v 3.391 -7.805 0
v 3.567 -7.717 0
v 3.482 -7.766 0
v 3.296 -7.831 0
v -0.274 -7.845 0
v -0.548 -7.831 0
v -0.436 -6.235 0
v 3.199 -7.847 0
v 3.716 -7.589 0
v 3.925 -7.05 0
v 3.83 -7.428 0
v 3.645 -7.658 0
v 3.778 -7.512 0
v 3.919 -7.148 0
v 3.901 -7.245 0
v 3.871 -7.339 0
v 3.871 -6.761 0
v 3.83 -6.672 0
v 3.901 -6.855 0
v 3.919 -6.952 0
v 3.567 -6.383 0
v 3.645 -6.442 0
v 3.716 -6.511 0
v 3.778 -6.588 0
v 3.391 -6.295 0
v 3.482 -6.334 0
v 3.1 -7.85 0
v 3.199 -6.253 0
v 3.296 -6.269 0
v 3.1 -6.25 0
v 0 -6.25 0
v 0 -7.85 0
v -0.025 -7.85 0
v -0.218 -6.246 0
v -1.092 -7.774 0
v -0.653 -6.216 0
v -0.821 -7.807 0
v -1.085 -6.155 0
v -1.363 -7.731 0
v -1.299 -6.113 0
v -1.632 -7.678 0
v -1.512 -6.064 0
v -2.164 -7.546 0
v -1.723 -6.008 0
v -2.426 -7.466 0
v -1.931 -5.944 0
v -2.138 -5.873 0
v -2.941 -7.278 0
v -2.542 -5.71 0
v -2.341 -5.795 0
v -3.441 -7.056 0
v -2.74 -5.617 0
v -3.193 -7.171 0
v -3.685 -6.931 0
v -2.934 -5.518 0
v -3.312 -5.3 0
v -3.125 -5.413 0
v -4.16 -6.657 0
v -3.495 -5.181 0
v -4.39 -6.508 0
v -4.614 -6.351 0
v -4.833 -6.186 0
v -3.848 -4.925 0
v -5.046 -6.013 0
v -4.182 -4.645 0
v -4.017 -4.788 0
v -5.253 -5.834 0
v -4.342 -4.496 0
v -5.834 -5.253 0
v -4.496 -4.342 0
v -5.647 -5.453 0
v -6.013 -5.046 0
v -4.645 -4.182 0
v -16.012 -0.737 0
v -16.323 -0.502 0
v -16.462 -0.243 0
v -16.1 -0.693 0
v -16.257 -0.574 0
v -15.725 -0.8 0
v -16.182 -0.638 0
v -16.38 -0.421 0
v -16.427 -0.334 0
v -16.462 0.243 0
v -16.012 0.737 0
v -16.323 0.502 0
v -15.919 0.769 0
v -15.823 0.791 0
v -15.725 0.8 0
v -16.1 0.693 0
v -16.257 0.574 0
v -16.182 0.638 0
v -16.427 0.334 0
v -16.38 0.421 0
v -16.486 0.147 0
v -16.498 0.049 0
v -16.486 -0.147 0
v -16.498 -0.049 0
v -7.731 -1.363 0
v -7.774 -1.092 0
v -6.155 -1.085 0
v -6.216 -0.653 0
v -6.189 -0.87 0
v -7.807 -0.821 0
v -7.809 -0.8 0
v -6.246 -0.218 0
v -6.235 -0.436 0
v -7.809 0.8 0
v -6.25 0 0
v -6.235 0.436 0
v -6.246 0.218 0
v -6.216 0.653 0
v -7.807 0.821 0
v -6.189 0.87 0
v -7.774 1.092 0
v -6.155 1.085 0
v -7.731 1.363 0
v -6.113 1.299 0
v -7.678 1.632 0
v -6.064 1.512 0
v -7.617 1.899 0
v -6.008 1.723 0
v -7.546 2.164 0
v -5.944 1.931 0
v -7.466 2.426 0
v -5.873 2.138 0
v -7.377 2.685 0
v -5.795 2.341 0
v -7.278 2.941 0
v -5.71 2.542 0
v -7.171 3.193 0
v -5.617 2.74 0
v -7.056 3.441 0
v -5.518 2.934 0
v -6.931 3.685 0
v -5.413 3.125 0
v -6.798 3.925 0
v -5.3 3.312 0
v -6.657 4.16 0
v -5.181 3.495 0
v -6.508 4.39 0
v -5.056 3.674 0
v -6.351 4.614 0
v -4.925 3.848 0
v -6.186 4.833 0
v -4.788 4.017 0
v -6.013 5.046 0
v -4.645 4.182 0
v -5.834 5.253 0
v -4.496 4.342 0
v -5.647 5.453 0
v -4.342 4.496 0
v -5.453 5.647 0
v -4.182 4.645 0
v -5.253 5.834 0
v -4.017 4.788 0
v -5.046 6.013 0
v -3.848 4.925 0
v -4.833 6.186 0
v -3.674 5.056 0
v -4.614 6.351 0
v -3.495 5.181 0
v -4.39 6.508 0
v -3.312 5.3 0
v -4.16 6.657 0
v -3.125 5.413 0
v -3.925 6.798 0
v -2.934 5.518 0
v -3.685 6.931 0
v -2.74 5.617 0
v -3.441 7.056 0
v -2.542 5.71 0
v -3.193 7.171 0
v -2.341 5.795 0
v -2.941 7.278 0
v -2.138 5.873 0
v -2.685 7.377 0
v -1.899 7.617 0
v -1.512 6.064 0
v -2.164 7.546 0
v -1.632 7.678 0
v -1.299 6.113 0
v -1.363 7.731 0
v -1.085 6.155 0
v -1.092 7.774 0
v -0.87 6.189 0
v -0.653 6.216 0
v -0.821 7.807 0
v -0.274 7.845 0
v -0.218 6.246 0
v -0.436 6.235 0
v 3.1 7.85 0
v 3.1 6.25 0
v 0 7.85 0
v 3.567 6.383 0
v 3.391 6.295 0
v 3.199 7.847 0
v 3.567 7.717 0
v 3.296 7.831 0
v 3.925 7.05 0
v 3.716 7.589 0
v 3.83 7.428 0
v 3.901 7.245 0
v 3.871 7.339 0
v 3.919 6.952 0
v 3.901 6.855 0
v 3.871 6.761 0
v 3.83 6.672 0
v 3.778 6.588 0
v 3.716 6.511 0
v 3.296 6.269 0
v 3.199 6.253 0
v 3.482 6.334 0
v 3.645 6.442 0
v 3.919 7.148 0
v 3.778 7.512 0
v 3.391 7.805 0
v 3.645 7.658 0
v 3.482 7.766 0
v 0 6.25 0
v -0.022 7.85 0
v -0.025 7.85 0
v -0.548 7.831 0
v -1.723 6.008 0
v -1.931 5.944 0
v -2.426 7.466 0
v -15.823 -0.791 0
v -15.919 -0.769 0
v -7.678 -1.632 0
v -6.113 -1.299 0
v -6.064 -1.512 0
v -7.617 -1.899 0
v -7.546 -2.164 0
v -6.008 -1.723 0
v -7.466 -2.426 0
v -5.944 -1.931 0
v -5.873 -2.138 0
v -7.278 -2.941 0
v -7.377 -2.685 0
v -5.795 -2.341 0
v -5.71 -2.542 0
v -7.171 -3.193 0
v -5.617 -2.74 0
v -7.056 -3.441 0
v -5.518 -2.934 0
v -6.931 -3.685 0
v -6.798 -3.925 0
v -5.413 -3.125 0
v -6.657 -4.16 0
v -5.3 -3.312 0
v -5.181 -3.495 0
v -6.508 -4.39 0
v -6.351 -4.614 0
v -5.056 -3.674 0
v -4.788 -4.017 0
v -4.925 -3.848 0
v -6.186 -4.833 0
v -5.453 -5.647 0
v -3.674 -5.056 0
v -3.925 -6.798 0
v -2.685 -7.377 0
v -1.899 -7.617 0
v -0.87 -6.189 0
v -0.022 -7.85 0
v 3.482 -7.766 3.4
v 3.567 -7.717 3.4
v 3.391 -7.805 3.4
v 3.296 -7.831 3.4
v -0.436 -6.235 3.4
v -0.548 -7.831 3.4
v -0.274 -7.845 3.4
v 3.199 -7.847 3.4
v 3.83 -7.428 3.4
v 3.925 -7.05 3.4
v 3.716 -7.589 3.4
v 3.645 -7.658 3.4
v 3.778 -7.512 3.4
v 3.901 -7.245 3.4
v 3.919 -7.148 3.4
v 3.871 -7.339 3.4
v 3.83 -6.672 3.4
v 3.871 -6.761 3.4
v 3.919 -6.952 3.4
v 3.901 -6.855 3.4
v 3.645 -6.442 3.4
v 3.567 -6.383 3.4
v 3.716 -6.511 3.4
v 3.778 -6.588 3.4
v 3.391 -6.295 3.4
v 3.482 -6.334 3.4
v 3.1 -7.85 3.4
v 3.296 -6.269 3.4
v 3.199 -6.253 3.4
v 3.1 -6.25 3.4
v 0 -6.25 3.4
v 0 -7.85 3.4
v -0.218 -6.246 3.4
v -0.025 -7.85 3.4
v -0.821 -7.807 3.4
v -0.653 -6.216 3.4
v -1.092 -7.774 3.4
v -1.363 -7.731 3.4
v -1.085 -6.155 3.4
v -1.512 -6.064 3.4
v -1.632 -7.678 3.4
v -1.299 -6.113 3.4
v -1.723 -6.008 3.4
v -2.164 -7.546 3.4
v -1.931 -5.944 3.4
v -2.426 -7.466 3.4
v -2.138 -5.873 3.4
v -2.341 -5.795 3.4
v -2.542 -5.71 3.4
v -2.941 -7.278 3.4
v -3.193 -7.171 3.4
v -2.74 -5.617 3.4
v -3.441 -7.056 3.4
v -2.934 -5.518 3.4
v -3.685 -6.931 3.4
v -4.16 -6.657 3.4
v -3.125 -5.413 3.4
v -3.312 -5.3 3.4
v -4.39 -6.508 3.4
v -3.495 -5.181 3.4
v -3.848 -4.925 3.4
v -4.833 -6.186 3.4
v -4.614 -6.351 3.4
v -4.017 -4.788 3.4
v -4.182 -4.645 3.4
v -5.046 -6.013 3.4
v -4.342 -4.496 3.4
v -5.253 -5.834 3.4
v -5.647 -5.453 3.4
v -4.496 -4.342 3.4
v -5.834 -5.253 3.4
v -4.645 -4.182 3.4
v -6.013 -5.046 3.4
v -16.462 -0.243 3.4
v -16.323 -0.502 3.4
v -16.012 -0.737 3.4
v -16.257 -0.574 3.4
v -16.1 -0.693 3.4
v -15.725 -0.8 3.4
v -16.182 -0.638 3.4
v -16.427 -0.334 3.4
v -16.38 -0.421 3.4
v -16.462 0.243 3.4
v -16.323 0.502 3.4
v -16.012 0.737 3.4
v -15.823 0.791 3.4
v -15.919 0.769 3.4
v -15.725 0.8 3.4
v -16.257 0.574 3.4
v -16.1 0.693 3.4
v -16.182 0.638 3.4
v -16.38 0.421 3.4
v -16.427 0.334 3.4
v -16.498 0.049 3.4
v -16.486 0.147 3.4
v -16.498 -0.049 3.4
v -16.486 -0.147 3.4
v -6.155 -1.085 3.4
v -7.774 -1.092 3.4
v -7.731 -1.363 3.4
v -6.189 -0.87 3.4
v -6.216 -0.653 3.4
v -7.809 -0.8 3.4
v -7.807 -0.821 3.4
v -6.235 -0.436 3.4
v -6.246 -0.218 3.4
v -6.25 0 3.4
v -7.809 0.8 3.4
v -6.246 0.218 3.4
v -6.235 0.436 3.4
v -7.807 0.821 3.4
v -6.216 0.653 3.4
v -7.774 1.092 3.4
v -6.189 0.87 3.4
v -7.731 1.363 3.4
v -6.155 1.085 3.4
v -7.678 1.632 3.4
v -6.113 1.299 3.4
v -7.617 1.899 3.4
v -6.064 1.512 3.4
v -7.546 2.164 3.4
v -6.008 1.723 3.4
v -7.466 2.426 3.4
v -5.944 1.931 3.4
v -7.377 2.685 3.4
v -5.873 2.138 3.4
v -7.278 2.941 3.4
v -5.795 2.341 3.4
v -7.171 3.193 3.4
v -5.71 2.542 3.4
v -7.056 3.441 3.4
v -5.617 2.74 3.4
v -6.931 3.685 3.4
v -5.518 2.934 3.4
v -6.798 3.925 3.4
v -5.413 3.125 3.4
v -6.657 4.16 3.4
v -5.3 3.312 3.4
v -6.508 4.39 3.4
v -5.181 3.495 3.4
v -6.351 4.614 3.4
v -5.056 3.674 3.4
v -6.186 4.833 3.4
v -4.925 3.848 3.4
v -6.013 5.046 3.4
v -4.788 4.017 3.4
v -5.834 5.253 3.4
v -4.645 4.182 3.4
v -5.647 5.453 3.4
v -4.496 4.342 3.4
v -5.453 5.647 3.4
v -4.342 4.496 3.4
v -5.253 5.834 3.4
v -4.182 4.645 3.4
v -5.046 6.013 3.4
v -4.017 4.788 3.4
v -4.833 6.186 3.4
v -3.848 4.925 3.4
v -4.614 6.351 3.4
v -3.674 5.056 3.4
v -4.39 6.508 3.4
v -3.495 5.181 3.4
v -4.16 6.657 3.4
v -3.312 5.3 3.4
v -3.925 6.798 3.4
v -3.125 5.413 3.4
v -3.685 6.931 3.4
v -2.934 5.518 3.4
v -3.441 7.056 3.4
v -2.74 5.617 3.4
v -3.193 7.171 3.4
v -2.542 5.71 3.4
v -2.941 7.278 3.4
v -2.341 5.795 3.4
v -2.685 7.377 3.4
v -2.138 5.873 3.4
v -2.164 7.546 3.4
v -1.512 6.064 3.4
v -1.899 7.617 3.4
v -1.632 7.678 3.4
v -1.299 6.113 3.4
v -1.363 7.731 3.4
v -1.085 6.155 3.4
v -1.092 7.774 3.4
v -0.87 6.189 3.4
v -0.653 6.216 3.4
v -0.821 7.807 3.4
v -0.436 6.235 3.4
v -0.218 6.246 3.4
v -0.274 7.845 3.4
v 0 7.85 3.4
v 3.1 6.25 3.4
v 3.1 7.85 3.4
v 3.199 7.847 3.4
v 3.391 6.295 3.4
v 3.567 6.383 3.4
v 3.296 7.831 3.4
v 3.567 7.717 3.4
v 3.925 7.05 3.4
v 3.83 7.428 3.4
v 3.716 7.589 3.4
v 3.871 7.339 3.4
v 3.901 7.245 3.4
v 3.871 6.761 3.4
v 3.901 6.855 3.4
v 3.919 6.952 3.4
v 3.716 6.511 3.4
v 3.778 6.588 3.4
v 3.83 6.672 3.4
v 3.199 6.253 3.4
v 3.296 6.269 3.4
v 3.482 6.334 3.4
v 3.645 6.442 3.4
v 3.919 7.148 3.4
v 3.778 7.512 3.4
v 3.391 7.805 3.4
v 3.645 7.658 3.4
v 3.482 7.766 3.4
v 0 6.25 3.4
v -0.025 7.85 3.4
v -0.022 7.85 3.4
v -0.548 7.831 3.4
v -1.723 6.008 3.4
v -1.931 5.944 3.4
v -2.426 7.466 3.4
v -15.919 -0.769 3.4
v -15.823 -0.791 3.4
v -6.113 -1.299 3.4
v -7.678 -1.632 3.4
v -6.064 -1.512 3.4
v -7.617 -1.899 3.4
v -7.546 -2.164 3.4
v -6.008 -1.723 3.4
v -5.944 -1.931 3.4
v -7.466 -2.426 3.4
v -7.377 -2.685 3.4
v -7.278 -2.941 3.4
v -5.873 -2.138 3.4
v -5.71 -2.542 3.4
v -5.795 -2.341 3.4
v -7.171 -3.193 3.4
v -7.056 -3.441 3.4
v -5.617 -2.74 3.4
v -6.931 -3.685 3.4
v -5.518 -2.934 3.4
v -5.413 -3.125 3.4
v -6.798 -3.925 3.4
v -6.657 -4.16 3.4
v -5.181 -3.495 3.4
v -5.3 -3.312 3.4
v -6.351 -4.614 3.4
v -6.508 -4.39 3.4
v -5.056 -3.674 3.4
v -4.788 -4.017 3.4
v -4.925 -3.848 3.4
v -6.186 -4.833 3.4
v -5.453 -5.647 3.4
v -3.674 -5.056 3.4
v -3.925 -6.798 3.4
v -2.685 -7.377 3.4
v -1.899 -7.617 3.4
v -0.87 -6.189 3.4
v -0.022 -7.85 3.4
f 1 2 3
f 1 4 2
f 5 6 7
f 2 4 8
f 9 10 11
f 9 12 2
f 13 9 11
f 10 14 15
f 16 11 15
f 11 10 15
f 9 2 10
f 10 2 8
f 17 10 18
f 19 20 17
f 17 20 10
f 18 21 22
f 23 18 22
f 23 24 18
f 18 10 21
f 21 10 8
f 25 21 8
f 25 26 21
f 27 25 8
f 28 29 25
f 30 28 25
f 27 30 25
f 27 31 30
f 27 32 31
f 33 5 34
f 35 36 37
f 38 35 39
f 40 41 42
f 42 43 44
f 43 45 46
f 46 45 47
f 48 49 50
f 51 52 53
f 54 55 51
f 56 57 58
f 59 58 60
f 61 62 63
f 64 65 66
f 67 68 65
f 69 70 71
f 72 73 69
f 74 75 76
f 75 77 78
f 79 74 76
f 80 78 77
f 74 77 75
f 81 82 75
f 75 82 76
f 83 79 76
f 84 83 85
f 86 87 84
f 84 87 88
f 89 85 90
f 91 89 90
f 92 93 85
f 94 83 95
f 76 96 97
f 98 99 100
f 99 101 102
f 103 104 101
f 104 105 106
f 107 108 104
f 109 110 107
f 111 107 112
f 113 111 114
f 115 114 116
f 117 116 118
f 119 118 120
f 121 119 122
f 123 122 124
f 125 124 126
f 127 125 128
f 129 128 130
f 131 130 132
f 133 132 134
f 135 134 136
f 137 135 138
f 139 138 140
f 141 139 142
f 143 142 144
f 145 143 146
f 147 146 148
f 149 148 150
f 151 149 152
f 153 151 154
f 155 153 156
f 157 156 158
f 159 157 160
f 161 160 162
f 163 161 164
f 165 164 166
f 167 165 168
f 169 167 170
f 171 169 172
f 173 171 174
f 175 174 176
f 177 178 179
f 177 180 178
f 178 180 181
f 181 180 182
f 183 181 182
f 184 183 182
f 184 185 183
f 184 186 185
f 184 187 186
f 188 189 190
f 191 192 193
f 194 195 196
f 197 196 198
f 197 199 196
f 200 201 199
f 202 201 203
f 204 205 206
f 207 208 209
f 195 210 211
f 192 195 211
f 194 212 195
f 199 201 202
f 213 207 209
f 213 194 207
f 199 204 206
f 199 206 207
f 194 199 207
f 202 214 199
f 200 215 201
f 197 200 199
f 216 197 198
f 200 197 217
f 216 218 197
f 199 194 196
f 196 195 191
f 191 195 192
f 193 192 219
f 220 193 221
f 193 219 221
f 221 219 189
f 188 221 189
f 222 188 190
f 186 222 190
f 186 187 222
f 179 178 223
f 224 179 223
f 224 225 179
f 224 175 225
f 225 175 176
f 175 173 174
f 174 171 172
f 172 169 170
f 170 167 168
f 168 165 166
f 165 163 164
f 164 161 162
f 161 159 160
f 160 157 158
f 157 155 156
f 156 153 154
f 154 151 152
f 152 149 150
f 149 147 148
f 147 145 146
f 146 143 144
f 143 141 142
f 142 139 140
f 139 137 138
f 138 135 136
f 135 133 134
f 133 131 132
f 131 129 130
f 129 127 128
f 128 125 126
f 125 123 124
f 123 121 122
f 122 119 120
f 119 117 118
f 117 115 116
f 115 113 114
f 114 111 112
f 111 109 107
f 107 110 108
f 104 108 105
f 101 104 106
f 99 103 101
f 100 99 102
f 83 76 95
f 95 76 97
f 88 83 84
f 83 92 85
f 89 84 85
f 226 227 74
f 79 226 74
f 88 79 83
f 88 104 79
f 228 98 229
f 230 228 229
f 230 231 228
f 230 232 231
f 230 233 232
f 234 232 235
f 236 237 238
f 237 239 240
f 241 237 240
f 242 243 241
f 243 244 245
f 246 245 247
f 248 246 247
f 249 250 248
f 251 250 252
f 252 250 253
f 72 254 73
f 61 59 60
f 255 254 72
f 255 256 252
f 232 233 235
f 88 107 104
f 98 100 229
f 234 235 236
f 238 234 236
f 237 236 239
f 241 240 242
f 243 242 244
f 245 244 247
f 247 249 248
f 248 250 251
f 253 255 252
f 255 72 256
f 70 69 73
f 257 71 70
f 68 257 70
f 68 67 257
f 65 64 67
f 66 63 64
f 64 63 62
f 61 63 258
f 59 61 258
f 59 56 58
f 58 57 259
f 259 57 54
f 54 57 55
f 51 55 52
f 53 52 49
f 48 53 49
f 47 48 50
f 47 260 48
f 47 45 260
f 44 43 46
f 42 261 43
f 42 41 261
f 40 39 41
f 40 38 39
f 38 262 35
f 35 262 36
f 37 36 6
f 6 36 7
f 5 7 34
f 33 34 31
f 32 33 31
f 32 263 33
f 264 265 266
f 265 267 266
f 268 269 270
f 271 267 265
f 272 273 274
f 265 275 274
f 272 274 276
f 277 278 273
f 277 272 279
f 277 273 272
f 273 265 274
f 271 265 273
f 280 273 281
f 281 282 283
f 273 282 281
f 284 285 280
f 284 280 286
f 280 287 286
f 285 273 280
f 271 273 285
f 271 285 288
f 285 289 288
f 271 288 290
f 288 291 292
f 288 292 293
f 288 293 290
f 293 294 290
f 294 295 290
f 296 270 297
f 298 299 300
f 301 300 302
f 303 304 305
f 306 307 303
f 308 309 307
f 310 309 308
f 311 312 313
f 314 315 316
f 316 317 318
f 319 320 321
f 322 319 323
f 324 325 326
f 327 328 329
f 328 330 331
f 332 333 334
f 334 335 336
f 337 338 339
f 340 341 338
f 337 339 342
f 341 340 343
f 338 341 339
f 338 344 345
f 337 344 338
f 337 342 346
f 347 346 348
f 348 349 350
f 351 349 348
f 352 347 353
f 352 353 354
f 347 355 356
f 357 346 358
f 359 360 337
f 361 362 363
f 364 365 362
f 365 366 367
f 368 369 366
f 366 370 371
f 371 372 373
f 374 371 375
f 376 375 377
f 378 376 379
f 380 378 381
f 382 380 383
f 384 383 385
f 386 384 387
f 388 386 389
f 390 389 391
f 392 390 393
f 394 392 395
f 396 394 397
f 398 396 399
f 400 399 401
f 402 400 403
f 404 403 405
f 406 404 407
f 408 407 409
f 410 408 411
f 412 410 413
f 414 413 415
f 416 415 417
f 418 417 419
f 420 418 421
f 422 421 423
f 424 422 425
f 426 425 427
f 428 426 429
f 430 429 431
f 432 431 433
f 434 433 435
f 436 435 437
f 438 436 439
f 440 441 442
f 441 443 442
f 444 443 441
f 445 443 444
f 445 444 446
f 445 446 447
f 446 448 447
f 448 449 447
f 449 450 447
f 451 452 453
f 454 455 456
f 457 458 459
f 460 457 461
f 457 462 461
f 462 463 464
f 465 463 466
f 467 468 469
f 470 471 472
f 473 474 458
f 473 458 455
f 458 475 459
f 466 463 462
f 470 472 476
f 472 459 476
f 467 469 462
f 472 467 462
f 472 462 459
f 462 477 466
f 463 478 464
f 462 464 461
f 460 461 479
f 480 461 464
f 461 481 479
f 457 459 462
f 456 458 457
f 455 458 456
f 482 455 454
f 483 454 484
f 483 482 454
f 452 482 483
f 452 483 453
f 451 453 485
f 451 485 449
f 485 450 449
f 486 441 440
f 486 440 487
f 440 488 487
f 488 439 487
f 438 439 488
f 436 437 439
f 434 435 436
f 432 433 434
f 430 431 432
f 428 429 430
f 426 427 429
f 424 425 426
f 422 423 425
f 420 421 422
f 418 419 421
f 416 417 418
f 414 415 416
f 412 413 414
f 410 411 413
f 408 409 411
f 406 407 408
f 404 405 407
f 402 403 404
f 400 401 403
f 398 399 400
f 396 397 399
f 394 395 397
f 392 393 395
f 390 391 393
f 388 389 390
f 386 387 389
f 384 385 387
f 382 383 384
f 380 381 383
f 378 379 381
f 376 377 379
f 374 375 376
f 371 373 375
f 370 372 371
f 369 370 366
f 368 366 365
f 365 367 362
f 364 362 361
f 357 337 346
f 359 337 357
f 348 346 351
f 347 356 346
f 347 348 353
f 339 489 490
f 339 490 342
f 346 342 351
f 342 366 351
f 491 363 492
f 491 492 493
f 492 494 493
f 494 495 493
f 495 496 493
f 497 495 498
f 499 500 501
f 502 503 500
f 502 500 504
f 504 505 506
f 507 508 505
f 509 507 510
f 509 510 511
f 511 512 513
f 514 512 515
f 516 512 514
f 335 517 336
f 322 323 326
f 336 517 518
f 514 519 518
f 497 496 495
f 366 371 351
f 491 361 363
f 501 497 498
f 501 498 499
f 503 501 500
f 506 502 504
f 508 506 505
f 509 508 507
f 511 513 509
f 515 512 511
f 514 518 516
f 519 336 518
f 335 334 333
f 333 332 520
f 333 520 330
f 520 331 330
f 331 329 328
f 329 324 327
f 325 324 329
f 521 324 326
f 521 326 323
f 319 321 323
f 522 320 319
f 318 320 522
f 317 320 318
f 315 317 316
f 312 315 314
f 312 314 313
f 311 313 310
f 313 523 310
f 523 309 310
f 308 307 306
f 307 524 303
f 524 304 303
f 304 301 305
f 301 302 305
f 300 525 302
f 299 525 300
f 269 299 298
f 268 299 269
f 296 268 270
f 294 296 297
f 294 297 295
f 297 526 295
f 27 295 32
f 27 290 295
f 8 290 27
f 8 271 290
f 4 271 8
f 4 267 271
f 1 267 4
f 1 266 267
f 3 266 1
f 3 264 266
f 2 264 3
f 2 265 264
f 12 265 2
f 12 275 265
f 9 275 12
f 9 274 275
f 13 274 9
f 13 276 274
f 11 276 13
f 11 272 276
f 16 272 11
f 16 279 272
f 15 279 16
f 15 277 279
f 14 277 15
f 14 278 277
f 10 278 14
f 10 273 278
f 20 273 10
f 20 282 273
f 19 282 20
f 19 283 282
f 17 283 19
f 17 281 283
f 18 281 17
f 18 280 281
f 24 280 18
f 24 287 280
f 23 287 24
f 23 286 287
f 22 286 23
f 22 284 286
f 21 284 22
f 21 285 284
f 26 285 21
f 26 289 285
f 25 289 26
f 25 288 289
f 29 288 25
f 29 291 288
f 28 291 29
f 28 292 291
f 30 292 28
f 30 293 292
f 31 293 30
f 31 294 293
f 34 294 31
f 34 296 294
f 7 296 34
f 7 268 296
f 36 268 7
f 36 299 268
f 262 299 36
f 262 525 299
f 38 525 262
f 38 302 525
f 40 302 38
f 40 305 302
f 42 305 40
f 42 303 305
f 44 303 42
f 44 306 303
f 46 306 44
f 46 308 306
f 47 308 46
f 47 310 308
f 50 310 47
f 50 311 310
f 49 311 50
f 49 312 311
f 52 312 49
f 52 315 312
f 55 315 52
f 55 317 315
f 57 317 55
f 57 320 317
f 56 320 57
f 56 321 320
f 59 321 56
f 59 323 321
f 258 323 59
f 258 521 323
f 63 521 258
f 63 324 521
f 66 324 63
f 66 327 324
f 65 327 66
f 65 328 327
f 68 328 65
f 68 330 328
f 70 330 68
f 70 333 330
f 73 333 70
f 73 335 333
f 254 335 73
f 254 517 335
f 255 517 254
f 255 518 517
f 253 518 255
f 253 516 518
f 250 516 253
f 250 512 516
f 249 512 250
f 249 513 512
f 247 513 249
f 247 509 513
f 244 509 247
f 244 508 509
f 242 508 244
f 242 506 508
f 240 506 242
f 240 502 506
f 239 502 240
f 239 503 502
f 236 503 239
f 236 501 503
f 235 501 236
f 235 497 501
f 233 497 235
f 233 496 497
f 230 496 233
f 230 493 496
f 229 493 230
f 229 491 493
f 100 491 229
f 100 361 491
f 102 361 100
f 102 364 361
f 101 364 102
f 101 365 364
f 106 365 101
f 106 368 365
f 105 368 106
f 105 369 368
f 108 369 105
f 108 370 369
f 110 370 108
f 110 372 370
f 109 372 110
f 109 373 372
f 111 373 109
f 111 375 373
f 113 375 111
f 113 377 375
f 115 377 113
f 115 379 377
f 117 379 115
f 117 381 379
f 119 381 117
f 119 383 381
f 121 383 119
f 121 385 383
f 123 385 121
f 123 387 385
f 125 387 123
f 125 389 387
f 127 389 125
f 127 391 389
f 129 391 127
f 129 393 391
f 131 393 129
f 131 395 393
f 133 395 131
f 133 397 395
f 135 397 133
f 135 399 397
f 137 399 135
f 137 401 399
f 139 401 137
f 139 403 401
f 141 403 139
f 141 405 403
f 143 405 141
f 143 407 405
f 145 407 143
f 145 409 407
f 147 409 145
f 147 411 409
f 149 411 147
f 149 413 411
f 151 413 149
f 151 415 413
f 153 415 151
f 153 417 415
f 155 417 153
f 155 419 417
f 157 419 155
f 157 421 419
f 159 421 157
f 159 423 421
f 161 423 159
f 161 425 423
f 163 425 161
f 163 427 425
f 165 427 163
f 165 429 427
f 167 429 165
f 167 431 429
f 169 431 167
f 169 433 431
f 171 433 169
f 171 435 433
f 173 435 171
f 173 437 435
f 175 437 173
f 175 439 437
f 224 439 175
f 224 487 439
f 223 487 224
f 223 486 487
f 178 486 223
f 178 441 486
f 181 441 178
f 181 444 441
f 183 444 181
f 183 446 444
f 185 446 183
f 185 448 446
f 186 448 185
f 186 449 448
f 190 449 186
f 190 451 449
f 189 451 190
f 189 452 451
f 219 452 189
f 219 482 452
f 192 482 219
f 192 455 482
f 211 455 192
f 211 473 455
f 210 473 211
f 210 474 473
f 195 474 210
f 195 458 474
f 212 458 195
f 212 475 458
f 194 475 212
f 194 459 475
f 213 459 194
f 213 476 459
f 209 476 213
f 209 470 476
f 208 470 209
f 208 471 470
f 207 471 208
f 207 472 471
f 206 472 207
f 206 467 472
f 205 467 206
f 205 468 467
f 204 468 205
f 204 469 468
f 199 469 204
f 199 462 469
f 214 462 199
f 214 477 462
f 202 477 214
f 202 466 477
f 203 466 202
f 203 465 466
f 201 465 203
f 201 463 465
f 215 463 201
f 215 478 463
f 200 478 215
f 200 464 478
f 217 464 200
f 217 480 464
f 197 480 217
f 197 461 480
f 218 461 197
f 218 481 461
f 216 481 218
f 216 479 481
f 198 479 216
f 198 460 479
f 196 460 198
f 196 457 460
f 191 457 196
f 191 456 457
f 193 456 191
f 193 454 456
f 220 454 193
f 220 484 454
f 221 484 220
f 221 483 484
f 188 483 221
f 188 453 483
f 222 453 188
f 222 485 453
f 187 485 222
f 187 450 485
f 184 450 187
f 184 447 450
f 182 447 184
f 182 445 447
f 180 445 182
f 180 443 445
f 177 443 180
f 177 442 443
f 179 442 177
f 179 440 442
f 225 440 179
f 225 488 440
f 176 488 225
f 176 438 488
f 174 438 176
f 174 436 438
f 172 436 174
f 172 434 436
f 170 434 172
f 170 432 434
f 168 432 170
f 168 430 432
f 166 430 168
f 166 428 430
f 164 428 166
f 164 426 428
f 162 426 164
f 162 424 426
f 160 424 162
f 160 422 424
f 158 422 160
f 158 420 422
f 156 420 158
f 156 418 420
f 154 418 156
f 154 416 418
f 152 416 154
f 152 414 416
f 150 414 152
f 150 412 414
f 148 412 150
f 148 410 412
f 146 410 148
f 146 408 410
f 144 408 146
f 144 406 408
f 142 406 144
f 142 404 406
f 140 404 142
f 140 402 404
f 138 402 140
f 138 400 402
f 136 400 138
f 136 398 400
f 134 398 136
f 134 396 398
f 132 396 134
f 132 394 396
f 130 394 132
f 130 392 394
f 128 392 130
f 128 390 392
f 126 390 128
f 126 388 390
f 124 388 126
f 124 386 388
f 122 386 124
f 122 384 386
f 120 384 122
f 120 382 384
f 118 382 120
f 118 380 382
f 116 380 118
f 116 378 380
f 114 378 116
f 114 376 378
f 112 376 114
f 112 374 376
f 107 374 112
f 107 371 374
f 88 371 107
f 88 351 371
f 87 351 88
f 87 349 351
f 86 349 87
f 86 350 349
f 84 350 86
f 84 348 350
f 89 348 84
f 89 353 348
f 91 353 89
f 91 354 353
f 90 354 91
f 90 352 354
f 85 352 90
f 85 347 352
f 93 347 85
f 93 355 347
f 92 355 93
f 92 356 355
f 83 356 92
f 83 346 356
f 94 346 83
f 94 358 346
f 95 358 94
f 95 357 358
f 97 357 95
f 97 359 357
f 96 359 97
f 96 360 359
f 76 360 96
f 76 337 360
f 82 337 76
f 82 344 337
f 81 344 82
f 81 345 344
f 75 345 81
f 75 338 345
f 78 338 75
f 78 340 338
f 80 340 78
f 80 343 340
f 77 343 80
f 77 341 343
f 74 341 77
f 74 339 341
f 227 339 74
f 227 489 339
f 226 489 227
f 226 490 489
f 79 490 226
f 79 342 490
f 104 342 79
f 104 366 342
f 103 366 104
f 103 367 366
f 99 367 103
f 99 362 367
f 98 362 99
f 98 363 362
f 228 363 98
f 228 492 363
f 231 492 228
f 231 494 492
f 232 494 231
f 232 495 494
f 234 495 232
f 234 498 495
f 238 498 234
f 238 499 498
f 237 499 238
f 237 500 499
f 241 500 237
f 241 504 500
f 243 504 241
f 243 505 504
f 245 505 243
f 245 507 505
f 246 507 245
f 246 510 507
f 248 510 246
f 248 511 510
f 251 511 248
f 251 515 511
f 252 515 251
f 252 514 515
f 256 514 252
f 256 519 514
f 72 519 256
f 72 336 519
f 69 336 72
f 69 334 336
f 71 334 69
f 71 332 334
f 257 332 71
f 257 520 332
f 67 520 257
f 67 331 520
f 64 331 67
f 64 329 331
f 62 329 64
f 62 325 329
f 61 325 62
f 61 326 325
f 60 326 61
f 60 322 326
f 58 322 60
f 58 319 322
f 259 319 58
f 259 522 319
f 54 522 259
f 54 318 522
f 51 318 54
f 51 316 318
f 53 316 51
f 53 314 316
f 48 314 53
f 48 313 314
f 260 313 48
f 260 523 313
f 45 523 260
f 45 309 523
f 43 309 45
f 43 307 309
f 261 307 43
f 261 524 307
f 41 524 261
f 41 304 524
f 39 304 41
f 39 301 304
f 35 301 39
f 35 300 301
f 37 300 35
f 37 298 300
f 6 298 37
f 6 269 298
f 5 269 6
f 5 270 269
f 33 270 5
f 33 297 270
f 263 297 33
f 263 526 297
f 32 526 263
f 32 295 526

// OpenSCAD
$fs = $preview ? 1 : 0.1;
$fa = $preview ? 3 : 2;

$nozzle = 0.4;

inner_dia = 12.5;
height = 3.4;
width = 4 * $nozzle;
outer_dia = inner_dia + 2 * width;

linear_extrude(height) {
  intersection() {
    difference() {
      circle(d = outer_dia);
      circle(d = inner_dia);
    }
    translate([-outer_dia / 2, -outer_dia / 2]) square([outer_dia / 2, outer_dia]);
  }
  for (k = [-1, 1]) scale([1, k]) {
    translate([0, (outer_dia + inner_dia) / 4]) {
      hull() {
        circle(d = width);
        translate([inner_dia / 4, 0]) circle(d = width);
      }
    }
  }
  hull() {
    translate([-(outer_dia + inner_dia) / 4, 0]) circle(d = width);
    translate([-outer_dia, 0]) circle(d = width);
  }
}
